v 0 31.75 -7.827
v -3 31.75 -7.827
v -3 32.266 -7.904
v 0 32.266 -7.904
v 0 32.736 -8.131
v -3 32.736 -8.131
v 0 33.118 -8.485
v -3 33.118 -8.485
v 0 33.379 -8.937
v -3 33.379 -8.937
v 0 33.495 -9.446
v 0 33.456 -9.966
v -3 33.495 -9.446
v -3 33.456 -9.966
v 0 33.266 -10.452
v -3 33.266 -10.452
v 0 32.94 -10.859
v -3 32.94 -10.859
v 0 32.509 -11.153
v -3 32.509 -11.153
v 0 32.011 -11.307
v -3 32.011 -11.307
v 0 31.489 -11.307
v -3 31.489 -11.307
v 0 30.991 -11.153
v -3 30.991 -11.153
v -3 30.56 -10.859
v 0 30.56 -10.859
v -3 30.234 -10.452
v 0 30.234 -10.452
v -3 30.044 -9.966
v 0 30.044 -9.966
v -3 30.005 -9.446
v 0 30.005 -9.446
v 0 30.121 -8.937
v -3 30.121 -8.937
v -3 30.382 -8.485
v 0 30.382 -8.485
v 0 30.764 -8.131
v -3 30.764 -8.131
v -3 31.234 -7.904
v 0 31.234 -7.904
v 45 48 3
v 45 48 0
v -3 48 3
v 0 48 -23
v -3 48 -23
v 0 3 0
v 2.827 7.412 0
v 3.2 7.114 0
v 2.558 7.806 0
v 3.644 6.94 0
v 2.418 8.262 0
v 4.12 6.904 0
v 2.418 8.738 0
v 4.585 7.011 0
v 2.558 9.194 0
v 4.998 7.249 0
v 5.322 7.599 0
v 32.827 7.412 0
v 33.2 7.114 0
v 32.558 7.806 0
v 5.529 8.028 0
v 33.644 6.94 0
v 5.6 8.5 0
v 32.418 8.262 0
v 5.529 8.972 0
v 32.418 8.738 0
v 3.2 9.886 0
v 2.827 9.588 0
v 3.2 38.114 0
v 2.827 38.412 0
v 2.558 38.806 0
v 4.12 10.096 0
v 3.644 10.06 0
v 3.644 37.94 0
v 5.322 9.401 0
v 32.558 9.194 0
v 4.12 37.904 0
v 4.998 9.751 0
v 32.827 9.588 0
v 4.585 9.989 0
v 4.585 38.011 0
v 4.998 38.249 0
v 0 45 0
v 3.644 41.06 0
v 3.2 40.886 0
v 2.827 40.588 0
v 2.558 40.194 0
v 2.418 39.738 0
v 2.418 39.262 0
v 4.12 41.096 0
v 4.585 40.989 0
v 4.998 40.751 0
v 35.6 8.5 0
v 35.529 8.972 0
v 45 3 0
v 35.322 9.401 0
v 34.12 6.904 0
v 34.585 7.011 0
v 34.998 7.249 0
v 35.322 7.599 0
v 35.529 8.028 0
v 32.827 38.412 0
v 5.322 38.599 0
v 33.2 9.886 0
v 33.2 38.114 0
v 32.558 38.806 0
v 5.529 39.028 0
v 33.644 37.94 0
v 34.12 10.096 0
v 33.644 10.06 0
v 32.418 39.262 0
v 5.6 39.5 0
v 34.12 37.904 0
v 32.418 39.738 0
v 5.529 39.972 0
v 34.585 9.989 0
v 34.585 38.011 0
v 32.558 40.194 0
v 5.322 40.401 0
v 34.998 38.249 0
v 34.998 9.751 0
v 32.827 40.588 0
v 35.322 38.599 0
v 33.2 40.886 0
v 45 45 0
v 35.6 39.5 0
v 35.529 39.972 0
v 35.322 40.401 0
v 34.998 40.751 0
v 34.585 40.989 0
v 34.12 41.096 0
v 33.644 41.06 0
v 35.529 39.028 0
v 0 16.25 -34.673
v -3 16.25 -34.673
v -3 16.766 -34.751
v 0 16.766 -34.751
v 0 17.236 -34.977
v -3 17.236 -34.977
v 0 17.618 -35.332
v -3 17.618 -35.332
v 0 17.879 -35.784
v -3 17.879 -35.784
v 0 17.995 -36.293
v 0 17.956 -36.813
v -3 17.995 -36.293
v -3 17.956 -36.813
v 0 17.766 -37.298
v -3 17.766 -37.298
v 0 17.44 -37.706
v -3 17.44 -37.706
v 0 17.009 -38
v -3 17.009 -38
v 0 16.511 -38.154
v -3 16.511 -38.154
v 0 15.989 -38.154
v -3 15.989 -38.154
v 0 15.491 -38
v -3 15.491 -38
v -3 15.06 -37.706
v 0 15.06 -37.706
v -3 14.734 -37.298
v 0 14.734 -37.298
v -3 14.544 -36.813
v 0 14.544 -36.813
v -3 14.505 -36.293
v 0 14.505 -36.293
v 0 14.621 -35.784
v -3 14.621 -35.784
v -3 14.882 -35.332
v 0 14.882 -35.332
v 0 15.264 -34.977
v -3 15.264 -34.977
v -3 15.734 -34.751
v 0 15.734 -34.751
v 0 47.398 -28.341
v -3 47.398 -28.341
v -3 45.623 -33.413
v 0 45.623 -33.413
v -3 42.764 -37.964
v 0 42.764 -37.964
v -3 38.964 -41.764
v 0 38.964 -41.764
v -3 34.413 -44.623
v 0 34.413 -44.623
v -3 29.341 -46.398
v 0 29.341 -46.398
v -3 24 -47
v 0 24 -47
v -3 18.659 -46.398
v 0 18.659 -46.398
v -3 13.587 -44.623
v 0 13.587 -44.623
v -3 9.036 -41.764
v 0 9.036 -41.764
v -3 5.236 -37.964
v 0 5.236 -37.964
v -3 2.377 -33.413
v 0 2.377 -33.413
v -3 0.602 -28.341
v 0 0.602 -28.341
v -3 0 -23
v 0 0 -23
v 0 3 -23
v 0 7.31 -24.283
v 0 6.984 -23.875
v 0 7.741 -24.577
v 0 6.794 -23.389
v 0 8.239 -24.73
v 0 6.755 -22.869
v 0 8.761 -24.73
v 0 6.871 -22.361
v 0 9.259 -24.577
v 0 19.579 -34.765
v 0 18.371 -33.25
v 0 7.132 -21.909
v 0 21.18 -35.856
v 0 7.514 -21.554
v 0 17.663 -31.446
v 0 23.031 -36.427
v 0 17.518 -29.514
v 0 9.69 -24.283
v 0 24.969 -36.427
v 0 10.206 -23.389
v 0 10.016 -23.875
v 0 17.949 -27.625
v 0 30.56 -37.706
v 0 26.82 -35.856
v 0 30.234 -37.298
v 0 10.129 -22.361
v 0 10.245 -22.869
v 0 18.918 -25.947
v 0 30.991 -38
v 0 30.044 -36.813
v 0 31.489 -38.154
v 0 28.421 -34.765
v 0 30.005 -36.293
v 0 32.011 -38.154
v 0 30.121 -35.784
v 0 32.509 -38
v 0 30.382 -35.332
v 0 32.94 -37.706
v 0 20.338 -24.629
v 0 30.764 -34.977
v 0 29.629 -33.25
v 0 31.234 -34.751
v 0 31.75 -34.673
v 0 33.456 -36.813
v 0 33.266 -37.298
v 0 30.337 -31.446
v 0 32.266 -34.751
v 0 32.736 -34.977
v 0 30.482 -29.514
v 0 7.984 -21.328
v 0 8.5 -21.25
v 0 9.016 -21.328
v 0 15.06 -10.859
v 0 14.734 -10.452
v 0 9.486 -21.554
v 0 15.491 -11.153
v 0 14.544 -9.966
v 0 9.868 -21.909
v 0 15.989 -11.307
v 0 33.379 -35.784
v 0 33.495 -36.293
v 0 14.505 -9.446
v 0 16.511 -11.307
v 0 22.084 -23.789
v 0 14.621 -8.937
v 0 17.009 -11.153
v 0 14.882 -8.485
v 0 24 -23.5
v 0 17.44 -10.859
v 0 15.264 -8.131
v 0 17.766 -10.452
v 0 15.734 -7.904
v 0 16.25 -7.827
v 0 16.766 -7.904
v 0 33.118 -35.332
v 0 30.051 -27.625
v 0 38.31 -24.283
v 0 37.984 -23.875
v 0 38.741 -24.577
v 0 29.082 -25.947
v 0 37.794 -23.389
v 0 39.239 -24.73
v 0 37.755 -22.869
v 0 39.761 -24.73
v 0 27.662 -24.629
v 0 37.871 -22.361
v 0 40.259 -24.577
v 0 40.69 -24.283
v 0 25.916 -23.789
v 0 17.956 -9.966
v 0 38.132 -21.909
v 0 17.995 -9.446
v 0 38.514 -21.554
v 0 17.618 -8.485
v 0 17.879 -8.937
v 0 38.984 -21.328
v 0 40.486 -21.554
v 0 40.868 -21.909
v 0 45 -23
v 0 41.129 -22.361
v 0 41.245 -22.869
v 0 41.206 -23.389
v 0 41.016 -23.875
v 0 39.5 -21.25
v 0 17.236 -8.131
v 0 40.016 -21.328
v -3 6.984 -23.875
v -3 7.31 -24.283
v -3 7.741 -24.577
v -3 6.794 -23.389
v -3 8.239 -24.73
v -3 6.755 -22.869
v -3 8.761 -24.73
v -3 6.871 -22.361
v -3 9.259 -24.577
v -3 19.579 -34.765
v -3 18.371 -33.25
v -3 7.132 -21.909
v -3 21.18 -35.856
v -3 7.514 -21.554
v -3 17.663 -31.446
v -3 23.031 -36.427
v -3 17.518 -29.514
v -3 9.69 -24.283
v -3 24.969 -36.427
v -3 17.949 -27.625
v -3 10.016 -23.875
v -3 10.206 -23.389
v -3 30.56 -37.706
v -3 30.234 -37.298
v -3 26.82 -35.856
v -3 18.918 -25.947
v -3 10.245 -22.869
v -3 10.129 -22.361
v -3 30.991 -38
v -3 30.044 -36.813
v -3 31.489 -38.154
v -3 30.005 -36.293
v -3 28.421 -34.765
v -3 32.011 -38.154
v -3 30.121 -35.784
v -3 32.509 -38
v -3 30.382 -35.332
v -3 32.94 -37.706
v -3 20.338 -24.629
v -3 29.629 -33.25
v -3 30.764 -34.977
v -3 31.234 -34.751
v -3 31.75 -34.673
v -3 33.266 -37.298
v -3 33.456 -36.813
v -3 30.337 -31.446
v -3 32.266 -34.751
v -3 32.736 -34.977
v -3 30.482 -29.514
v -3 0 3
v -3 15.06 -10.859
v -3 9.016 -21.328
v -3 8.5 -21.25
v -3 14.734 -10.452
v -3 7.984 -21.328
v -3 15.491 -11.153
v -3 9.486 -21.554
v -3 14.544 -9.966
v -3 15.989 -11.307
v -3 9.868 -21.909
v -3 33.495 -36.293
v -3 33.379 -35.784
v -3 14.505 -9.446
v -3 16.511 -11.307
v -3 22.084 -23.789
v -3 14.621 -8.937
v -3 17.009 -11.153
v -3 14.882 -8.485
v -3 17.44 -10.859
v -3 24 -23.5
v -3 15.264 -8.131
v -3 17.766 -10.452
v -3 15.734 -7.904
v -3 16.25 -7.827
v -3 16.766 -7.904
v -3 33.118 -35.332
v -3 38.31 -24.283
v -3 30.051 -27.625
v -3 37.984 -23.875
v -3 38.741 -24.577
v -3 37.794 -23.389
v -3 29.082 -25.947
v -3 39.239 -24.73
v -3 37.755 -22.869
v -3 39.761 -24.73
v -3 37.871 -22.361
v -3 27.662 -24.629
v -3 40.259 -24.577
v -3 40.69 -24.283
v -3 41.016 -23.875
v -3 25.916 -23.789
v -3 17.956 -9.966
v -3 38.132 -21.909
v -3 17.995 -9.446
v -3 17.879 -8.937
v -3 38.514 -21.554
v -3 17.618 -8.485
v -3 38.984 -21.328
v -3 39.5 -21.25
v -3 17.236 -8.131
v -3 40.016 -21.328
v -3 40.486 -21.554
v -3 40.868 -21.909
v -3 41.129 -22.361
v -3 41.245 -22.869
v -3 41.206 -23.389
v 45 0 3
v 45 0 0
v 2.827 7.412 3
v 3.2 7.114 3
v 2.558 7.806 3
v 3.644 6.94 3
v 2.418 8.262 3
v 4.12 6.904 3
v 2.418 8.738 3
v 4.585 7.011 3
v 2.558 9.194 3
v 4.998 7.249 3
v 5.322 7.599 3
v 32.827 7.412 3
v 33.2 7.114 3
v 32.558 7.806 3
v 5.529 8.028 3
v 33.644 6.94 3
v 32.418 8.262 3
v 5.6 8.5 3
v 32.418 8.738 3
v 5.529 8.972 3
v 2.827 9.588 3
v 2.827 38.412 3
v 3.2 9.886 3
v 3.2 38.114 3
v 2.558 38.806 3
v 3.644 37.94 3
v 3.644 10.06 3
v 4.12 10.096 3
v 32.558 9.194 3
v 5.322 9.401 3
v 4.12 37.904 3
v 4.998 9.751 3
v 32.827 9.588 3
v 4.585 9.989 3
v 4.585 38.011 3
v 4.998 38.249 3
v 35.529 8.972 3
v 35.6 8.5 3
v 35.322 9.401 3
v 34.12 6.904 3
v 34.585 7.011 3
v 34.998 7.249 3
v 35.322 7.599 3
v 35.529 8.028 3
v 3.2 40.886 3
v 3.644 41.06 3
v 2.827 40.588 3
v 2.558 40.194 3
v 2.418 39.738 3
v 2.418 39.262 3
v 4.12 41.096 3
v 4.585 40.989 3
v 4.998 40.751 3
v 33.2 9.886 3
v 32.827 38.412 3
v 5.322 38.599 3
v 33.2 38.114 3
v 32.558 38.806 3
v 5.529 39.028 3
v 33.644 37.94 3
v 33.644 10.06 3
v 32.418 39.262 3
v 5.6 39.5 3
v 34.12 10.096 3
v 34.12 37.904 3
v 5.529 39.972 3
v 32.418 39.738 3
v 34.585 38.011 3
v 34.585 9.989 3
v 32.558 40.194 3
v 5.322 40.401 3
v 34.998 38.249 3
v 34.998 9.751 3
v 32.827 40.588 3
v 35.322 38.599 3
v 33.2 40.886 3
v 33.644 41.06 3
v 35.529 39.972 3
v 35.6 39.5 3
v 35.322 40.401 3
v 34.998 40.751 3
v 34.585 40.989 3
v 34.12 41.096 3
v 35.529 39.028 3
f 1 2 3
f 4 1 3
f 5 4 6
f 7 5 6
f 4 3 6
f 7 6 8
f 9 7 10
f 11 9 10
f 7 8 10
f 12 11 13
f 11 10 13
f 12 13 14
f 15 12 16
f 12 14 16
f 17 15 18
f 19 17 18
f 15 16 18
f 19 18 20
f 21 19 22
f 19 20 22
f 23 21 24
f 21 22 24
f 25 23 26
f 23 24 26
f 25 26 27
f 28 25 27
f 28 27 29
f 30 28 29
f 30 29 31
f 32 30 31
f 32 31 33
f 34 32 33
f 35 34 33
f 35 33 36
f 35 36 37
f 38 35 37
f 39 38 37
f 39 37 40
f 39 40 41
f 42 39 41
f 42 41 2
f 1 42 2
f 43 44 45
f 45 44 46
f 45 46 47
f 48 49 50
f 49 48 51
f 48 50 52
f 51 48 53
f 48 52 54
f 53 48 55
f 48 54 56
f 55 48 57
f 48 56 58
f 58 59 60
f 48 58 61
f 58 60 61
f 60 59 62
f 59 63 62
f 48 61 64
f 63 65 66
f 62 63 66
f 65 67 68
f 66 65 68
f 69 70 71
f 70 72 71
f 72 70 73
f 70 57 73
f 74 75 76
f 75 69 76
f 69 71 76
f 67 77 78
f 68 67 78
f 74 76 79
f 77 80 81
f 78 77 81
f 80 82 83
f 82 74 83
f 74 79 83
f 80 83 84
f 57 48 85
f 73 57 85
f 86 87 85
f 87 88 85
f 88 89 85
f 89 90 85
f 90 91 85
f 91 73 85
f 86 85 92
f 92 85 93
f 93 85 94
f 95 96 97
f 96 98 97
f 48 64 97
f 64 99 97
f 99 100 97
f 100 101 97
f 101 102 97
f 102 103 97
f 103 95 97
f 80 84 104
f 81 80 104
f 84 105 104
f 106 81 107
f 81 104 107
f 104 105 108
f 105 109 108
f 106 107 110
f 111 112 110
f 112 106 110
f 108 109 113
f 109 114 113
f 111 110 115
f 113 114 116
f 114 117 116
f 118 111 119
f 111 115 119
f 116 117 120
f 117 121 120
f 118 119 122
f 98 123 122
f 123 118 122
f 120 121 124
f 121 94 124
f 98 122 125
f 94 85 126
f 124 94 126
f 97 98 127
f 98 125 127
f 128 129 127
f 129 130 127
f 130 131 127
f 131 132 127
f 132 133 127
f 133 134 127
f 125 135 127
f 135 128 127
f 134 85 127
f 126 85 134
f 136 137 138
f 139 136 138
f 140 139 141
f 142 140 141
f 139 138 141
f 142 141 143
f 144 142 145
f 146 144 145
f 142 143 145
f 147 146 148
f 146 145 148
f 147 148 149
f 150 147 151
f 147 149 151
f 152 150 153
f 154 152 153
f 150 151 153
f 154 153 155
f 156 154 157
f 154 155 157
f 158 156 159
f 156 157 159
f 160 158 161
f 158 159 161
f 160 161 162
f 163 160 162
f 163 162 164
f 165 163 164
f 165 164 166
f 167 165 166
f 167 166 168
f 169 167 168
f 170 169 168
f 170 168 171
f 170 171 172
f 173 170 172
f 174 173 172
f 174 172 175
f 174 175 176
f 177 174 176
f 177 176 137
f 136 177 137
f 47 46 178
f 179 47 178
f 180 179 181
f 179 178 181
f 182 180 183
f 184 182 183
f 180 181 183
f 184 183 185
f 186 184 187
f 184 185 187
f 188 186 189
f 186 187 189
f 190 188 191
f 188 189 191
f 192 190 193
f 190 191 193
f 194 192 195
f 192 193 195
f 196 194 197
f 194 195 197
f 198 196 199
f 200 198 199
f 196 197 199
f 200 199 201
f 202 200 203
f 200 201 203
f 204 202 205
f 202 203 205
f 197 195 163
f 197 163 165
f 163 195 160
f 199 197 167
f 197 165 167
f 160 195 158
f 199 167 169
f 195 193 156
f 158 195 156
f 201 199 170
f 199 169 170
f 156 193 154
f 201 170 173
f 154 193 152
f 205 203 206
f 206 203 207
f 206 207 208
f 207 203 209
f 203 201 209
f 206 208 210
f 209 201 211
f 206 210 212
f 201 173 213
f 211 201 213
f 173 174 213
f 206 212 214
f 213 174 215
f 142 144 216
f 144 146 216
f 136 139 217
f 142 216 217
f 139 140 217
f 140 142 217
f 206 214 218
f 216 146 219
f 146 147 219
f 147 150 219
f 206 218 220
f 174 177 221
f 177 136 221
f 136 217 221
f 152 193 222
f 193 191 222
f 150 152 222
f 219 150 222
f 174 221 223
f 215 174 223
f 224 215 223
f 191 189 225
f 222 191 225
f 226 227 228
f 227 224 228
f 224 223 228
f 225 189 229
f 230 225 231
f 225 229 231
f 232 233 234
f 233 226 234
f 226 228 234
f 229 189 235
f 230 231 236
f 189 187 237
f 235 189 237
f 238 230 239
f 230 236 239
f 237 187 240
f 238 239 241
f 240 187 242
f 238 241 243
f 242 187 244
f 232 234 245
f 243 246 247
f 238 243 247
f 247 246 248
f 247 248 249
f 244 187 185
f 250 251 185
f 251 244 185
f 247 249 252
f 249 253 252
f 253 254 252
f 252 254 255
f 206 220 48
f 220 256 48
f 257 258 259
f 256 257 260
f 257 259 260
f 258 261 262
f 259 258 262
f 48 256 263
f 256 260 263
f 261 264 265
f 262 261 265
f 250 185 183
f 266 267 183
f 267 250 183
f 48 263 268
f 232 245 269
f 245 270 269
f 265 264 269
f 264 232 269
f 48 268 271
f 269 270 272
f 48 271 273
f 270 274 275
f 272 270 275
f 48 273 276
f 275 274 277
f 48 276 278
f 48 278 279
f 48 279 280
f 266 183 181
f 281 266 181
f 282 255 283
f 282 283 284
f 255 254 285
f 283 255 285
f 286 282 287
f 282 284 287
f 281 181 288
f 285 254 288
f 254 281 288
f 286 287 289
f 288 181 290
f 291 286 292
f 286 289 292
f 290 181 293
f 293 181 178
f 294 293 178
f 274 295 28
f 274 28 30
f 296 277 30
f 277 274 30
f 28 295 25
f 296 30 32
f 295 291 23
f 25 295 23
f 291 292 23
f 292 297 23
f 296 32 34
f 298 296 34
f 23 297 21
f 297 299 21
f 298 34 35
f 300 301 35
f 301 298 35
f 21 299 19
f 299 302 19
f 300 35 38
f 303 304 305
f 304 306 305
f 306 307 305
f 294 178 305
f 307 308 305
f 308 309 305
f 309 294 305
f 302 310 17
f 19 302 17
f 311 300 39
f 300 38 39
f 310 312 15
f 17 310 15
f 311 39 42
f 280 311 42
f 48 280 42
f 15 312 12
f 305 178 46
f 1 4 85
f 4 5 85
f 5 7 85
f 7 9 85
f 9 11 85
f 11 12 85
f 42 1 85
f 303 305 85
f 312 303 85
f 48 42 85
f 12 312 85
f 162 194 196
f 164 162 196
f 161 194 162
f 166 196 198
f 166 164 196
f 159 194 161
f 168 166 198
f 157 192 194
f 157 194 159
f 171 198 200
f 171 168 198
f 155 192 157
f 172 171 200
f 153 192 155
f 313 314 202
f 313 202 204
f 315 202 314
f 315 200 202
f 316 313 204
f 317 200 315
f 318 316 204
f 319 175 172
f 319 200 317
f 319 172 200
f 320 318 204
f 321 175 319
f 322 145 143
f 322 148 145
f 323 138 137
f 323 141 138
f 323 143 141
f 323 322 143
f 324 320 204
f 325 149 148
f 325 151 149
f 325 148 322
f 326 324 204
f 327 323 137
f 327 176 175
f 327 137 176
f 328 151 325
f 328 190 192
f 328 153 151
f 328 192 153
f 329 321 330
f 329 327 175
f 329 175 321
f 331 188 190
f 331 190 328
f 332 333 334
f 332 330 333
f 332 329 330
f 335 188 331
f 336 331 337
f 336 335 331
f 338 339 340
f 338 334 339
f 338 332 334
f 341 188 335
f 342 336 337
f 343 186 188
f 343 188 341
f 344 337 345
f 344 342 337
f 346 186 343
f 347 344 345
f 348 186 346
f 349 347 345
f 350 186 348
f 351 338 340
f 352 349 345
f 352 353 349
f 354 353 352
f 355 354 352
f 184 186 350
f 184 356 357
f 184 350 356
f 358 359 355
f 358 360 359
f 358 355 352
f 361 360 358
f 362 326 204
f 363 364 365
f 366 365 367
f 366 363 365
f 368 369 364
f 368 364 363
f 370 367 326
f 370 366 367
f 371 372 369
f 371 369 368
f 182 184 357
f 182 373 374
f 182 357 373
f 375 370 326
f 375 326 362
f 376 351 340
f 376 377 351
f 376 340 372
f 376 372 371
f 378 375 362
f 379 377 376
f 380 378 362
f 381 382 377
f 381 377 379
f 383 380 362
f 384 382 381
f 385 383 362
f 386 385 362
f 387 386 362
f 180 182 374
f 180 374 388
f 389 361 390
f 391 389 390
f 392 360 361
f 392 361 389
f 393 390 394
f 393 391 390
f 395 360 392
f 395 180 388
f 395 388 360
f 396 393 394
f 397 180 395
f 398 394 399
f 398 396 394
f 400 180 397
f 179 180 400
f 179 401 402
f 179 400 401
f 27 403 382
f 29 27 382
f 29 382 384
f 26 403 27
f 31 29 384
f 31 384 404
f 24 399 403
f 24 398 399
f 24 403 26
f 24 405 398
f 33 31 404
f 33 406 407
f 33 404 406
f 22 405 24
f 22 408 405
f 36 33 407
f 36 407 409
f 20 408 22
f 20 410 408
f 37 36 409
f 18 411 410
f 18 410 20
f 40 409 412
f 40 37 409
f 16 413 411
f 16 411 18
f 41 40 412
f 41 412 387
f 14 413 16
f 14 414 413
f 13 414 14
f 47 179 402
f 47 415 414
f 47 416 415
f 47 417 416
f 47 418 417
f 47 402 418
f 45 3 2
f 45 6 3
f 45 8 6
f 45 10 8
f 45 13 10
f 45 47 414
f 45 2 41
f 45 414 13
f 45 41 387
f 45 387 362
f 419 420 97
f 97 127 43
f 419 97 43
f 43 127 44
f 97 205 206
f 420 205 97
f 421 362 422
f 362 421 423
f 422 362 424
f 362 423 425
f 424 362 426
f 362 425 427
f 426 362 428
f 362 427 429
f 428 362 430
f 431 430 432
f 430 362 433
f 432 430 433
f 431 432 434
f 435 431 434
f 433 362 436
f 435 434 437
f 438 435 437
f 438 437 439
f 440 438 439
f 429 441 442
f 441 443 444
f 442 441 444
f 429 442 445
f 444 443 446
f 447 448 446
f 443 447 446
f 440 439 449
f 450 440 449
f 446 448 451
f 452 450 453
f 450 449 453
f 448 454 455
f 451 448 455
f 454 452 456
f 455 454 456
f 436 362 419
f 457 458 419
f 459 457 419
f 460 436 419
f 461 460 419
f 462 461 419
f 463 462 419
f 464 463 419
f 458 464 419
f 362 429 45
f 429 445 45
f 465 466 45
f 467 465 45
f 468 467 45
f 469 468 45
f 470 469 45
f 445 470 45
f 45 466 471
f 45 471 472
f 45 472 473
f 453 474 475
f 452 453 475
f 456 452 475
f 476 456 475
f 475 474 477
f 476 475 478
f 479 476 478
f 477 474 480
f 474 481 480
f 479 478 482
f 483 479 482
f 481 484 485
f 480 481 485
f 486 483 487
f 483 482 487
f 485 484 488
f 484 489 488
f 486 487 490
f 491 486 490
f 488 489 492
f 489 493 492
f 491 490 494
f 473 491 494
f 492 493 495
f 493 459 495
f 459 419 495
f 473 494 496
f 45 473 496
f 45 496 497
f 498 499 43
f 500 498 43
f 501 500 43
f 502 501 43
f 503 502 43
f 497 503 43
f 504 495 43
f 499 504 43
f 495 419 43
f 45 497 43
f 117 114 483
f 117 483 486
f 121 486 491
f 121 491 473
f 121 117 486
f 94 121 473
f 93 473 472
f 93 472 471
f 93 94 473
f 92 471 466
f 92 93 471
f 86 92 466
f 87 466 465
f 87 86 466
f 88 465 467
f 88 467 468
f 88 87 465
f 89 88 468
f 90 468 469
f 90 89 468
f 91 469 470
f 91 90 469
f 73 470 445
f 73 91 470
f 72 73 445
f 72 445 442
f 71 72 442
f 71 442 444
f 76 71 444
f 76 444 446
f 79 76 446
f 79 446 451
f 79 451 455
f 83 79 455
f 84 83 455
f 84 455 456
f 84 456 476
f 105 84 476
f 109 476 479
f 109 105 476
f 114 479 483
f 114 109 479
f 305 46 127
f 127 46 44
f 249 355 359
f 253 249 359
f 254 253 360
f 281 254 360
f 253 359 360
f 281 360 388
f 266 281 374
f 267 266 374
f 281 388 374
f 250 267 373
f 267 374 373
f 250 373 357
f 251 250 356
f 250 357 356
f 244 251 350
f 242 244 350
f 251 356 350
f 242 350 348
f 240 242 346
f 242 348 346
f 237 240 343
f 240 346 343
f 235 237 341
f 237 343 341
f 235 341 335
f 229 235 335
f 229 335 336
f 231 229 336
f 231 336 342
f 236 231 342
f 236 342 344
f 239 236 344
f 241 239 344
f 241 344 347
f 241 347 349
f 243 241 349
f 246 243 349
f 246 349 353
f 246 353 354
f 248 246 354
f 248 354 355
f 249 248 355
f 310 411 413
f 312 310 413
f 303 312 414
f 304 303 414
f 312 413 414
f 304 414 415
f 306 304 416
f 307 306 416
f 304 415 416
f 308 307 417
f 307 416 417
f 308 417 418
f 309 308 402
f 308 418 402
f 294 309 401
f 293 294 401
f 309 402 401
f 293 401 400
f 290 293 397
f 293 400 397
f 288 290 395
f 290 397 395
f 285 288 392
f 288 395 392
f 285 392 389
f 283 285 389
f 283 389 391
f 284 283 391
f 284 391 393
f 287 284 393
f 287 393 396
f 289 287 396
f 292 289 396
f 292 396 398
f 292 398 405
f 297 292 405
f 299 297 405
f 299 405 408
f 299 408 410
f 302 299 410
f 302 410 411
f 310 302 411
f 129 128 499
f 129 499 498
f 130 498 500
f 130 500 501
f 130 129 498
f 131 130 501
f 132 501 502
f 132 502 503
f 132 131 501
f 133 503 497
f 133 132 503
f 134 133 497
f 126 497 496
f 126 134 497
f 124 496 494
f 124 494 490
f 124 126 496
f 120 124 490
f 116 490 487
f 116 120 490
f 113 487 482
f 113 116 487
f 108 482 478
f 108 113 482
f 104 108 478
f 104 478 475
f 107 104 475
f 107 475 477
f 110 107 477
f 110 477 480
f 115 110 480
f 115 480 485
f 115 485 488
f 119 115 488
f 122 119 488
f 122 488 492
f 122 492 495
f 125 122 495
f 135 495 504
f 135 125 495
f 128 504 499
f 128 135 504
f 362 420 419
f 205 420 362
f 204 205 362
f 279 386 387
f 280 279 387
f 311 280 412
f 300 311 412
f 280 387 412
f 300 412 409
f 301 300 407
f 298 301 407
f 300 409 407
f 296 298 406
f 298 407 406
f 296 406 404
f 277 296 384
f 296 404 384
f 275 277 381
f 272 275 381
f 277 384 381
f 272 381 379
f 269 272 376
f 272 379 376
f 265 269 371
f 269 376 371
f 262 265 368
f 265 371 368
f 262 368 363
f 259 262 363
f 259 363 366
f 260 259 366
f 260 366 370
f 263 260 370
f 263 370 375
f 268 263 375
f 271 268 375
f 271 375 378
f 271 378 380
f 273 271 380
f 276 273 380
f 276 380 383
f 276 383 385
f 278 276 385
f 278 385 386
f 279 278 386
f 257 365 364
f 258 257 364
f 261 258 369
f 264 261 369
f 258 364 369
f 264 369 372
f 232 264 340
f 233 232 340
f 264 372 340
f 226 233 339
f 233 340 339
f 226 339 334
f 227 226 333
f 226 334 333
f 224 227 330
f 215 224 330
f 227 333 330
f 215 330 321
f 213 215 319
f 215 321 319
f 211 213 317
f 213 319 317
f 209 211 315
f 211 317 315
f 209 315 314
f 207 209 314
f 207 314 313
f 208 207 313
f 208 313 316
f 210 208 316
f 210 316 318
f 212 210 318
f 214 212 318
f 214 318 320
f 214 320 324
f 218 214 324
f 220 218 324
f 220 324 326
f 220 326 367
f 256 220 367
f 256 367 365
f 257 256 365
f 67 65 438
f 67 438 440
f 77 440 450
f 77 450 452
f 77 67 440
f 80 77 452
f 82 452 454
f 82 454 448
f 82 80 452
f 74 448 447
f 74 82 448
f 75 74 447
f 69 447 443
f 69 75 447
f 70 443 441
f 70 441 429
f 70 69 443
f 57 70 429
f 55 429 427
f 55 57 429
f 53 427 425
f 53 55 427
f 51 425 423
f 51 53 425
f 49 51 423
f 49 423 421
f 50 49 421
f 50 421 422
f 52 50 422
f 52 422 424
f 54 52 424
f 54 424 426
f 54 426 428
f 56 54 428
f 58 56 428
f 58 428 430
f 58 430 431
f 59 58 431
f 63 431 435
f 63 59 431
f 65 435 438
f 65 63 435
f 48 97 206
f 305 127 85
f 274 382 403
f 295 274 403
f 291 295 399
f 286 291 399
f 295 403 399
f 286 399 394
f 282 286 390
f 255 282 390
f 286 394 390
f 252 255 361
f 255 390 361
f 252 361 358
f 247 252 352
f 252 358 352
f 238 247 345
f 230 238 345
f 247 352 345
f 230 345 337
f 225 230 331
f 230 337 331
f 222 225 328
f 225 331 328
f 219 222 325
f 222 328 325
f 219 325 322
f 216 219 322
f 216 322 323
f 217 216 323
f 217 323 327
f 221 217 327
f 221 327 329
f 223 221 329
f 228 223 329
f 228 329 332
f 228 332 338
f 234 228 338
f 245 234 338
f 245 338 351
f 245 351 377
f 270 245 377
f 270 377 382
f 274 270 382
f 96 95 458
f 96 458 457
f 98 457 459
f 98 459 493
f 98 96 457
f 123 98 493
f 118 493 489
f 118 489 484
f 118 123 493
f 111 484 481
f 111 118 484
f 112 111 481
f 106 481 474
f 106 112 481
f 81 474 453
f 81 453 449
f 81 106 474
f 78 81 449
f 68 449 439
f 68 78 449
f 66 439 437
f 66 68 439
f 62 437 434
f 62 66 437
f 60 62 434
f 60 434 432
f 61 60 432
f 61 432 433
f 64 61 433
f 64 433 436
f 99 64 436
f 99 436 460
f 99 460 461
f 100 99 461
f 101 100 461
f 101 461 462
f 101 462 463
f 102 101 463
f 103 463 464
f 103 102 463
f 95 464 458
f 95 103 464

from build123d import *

# Parameters (mm, degrees)
SKETCH1_W           = 45
SKETCH1_H           = 48
SKETCH1_R           = 1.6
BOSS_EXTRUDE1_DEPTH = 3
BOSS_EXTRUDE2_DEPTH = 3
SKETCH4_R           = 6.5
SKETCH4_R_2         = 1.75
CUT_EXTRUDE1_DEPTH  = 10
BOSS_EXTRUDE3_DEPTH = 3
BOSS_EXTRUDE4_START = -48
BOSS_EXTRUDE4_DEPTH = 3


with BuildPart() as part:
    # Sketch1 → Boss-Extrude1 (new body)
    with BuildSketch(Plane.XY):
        with Locations((22.5, 24)):
            Rectangle(SKETCH1_W, SKETCH1_H)
        with Locations((4, 8.5)):
            Circle(SKETCH1_R, mode=Mode.SUBTRACT)
        with Locations((4, 39.5)):
            Circle(SKETCH1_R, mode=Mode.SUBTRACT)
        with Locations((34, 8.5)):
            Circle(SKETCH1_R, mode=Mode.SUBTRACT)
        with Locations((34, 39.5)):
            Circle(SKETCH1_R, mode=Mode.SUBTRACT)
    extrude(amount=BOSS_EXTRUDE1_DEPTH)

    # Sketch2 → Boss-Extrude2 (add)
    with BuildSketch(Plane.ZY):
        with BuildLine():
            Line((3, 48), (-23, 48))
            ThreePointArc((-23, 48), (-47, 24), (-23, 0))
            Line((-23, 0), (3, 0))
            Line((3, 0), (3, 48))
        make_face()
    extrude(amount=BOSS_EXTRUDE2_DEPTH)

    # Sketch4 → Cut-Extrude1 (cut)
    with BuildSketch(Plane.ZY.offset(3)):
        with Locations((-30, 24)):
            Circle(SKETCH4_R)
        with Locations((-23, 39.5)):
            Circle(SKETCH4_R_2)
        with Locations((-9.576606241, 31.75)):
            Circle(SKETCH4_R_2)
        with Locations((-9.576606241, 16.25)):
            Circle(SKETCH4_R_2)
        with Locations((-23, 8.5)):
            Circle(SKETCH4_R_2)
        with Locations((-36.423393759, 16.25)):
            Circle(SKETCH4_R_2)
        with Locations((-36.423393759, 31.75)):
            Circle(SKETCH4_R_2)
    extrude(amount=-CUT_EXTRUDE1_DEPTH, mode=Mode.SUBTRACT)

    # Sketch5 → Boss-Extrude3 (add)
    with BuildSketch(Plane(origin=(0, 48, 0), x_dir=(1, 0, 0), z_dir=(0, 1, 0))):
        Polygon((0, 23), (45, 0), (0, 0), align=None)
    extrude(amount=-BOSS_EXTRUDE3_DEPTH)

    # Sketch5<2> → Boss-Extrude4 (add)
    with BuildSketch(Plane(origin=(0, 48, 0), x_dir=(1, 0, 0), z_dir=(0, 1, 0)).offset(BOSS_EXTRUDE4_START)):
        Polygon((0, 23), (45, 0), (0, 0), align=None)
    extrude(amount=BOSS_EXTRUDE4_DEPTH)


solid = part.part
